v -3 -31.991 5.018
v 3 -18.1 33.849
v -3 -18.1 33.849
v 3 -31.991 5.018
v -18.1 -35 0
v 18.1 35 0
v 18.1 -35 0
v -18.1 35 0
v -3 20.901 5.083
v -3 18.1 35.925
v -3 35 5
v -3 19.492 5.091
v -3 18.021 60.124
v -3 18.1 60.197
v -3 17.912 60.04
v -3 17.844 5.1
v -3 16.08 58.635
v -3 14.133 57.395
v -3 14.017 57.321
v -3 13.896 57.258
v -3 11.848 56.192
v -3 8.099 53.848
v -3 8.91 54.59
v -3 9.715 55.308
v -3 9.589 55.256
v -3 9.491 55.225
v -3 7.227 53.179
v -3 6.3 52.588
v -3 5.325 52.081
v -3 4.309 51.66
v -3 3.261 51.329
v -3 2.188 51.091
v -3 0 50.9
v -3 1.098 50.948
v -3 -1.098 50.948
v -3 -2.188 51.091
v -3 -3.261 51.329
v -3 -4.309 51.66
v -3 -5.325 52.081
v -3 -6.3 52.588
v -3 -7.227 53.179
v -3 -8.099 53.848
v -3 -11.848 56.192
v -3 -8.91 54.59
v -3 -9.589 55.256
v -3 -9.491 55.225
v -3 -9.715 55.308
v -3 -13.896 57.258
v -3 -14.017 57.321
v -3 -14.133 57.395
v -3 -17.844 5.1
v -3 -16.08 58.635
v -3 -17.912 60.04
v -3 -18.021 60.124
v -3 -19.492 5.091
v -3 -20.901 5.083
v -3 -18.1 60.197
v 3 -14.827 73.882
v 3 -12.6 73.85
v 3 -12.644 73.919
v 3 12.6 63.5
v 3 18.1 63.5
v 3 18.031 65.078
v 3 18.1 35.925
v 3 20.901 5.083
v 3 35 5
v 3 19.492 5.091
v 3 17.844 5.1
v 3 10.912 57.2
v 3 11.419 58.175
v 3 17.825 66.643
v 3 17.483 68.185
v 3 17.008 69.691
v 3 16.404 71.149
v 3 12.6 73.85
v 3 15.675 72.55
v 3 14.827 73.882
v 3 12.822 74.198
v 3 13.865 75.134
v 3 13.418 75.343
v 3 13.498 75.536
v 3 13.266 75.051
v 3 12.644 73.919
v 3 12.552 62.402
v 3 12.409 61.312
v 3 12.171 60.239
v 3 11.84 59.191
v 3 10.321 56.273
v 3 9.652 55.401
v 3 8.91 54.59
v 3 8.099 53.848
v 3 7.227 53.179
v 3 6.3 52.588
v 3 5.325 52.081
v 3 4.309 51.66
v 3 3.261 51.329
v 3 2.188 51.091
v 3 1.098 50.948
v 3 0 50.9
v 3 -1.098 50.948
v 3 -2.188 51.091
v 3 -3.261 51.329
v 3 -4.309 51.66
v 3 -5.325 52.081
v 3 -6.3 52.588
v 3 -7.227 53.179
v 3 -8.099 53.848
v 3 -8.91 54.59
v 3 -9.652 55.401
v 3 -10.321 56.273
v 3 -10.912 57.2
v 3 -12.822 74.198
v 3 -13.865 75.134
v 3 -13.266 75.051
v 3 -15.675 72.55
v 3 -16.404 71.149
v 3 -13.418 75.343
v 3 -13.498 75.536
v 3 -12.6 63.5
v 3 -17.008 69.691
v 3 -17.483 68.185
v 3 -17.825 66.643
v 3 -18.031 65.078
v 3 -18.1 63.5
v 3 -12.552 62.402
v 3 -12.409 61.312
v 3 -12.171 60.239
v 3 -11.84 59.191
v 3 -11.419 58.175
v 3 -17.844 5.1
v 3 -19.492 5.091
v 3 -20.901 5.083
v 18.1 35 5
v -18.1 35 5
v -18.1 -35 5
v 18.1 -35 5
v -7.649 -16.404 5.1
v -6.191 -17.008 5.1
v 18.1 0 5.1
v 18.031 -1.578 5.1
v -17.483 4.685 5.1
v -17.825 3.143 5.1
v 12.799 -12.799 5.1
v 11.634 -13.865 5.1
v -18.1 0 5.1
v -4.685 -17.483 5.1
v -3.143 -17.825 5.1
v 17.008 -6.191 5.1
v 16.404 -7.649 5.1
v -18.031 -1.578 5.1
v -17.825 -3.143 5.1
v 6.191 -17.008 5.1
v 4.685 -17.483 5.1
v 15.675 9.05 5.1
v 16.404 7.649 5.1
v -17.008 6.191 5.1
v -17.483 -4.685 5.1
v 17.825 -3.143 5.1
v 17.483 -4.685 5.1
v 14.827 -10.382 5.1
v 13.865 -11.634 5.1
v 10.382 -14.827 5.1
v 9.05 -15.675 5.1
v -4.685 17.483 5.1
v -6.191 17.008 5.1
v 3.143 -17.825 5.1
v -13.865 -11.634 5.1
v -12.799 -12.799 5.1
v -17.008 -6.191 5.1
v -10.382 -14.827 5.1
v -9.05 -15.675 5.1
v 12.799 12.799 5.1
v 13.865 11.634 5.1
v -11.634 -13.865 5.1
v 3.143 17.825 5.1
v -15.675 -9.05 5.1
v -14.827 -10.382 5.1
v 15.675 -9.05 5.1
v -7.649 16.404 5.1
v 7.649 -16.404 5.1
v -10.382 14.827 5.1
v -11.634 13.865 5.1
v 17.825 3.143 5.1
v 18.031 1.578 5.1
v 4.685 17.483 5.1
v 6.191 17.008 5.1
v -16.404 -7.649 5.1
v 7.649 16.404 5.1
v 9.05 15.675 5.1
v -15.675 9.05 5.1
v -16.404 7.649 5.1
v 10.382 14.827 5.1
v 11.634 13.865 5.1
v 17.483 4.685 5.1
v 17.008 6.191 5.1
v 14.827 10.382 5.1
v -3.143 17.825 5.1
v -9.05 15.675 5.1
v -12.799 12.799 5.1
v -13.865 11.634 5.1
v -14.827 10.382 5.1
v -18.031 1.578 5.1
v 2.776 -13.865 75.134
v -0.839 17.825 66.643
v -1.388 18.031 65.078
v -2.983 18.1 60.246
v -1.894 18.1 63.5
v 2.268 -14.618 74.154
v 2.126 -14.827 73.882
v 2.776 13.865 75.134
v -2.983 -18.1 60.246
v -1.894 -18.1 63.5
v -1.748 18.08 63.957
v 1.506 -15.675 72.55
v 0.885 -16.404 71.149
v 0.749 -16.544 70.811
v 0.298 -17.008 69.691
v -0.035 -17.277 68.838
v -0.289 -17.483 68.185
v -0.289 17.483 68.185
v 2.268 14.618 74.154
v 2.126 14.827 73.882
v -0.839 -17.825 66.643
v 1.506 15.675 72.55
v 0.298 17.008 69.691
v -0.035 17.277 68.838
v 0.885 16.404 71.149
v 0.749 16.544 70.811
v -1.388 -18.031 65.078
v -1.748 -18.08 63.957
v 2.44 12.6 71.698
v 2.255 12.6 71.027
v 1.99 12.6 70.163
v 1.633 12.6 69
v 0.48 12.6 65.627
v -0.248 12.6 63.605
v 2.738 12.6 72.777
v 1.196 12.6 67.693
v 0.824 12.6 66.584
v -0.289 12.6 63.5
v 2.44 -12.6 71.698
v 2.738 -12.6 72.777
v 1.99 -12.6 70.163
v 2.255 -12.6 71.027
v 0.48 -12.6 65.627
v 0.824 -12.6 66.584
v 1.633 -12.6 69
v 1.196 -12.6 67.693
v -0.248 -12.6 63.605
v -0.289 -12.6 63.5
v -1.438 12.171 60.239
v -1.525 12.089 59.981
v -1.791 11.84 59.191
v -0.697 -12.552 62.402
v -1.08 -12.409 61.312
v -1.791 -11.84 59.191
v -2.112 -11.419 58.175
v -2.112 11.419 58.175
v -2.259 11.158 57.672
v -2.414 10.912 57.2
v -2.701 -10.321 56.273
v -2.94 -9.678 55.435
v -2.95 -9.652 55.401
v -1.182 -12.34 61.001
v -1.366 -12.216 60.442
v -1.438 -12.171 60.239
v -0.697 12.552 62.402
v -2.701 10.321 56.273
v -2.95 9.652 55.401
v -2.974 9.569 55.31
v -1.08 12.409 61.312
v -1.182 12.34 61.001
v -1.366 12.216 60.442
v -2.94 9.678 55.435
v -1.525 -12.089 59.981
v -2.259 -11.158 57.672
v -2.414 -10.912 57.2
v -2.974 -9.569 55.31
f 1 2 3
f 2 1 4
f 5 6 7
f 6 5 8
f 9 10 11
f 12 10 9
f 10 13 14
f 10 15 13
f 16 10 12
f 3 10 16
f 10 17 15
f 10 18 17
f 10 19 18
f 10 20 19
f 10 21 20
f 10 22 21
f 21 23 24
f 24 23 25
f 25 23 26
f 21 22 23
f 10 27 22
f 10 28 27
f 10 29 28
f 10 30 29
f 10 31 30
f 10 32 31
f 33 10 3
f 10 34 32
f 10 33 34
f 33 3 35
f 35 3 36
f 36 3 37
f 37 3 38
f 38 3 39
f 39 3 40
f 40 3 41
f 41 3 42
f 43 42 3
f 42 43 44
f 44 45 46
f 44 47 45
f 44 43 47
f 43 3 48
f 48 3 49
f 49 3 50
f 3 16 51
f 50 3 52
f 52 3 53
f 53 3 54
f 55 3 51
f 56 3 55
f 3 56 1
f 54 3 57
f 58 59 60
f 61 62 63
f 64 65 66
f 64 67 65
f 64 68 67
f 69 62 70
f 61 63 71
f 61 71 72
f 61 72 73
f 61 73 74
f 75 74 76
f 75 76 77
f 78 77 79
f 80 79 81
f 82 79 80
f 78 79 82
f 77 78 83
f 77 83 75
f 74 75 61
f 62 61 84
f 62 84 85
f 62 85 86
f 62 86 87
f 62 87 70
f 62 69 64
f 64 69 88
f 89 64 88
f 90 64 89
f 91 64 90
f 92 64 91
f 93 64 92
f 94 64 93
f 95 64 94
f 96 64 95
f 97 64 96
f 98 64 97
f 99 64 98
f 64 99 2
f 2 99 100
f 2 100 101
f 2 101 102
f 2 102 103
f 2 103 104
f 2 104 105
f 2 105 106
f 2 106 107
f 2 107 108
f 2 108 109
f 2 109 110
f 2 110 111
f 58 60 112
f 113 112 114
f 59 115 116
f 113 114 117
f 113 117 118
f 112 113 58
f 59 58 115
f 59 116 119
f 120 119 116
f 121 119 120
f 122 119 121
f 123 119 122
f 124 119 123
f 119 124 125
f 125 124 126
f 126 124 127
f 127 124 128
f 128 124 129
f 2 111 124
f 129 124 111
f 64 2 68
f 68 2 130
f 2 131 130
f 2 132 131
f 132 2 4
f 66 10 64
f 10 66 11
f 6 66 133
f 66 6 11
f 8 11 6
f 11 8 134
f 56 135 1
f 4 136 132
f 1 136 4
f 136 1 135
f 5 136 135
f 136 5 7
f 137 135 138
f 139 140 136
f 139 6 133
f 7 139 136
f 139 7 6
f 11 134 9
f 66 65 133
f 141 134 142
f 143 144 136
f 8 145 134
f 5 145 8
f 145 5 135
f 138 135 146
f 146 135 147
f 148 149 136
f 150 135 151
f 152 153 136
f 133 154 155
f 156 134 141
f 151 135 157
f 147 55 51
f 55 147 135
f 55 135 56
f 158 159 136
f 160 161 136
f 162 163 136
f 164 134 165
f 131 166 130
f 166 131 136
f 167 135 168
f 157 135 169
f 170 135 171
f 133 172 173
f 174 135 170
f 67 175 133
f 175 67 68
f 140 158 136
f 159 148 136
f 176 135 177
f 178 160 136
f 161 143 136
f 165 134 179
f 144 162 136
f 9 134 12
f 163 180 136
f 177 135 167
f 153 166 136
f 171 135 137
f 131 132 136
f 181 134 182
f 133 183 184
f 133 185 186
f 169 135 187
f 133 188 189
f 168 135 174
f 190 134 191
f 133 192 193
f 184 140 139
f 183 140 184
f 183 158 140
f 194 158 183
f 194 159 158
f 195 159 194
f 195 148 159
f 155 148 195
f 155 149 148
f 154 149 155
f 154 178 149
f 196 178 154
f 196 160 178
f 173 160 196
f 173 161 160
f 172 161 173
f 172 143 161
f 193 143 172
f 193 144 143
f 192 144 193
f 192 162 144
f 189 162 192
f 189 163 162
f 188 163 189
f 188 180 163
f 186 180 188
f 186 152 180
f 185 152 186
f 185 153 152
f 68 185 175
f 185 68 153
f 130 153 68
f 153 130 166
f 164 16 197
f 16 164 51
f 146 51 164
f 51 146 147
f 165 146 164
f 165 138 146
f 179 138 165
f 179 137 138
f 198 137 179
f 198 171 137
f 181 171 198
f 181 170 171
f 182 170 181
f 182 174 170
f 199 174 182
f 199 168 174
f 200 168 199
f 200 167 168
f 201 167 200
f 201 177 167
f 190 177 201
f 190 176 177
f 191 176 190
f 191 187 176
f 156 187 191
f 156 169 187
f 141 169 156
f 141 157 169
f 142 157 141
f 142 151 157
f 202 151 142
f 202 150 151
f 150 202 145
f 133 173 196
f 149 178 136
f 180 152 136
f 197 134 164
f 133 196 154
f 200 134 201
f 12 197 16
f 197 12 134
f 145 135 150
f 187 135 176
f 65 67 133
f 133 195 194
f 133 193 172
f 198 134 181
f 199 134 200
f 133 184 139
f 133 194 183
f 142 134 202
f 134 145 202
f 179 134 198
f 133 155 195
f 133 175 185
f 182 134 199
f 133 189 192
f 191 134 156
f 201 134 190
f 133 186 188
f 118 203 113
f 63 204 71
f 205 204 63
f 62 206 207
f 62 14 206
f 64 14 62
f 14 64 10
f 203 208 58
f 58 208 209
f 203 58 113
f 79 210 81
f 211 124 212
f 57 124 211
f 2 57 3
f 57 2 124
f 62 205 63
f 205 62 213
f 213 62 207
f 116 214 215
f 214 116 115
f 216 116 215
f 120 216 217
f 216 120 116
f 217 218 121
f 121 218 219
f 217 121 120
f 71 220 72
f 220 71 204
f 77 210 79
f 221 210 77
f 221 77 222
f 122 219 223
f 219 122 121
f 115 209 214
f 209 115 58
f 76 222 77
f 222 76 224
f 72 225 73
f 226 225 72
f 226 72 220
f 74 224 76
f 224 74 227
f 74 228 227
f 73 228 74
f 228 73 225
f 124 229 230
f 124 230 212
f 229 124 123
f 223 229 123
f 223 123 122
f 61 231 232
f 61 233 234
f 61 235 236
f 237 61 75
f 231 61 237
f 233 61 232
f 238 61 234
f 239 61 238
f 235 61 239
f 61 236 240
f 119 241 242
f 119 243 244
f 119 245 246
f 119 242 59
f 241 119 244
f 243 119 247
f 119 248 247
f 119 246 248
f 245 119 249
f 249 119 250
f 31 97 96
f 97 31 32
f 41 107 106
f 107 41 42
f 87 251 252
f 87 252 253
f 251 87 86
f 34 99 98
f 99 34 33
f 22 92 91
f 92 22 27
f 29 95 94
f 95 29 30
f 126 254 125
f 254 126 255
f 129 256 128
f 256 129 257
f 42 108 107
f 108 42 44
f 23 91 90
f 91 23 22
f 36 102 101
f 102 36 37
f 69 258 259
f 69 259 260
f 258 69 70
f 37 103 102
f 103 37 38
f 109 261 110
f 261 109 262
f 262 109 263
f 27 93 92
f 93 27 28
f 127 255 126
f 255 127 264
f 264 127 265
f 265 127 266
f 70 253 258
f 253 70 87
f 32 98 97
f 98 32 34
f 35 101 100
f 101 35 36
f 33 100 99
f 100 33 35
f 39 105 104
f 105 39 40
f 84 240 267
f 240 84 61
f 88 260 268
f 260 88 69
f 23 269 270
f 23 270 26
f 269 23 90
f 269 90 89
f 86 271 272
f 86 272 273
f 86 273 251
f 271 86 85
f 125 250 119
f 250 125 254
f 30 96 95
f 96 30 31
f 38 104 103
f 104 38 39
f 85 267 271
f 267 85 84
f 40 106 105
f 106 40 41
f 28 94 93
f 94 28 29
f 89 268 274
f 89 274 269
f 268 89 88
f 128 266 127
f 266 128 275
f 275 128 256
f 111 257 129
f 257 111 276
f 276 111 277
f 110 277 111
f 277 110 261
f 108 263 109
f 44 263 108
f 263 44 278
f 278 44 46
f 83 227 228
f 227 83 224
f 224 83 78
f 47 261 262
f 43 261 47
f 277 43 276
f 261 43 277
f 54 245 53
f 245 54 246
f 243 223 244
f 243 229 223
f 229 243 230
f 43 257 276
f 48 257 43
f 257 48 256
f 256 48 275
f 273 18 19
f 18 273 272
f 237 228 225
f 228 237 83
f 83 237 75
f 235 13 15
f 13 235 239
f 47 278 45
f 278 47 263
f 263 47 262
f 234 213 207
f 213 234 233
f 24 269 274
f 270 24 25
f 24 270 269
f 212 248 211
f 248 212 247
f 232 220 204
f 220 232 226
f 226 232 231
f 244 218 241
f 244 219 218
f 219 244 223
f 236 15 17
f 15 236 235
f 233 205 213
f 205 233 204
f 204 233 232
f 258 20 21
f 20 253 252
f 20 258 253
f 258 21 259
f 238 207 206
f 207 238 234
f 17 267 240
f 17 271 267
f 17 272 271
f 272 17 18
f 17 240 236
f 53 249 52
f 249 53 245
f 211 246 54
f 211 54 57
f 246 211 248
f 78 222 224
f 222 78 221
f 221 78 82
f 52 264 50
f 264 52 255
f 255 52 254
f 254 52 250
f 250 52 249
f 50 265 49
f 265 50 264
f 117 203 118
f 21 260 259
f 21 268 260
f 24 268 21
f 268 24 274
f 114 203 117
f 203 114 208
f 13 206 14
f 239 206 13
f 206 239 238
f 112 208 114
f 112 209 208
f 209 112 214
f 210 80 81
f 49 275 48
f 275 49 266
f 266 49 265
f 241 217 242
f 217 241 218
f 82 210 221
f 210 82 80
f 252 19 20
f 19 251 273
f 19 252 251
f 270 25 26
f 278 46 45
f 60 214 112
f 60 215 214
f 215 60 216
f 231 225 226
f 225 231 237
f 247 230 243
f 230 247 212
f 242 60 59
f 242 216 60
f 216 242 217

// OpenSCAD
// MTG Kiosk - label roll spool
//
// Freestanding holder that sits behind the printer and feeds the rear label
// inflow. Deliberately not bolted to the printer: the back face already
// carries USB, DC in, the power rocker and the label slot, and hanging a roll
// off it would crowd all four.
//
//   openscad -o label_spool.stl -D 'part="upright"' label_spool.scad
//   openscad -o spindle.stl     -D 'part="spindle"' label_spool.scad
//
// CONFIRM THESE AGAINST A REAL ROLL BEFORE PRINTING. They are the common
// values for 4x6 thermal stock, not measurements of the roll in hand, and the
// printer's own paperwork has already been wrong twice.

// -------------------------------------------------------------- roll (check)
roll_max_d   = 105.0;   // outside diameter of a full roll
roll_width   = 80.0;    // production stock here is 3in (76.2mm); 4in is 101.6
core_d       = 25.4;    // 1in core. The other common size is 38mm (1.5in)

// ------------------------------------------------------------------ hardware
spindle_d    = core_d - 1.2;   // slips inside the core and turns freely
spindle_over = 18.0;           // length beyond the roll, each side
slot_w       = spindle_d + 1.0;

base_t       = 5.0;
base_d       = 70.0;
upright_t    = 6.0;
wall         = 3.0;

// Spindle centre height. The roll has to clear the base at full diameter, and
// a little more so a fresh roll doesn't drag as it unwinds.
spindle_h    = roll_max_d / 2 + base_t + 6;

part = "upright";       // "upright" | "spindle" | "both"

$fn = 72;

// ------------------------------------------------------------------ geometry

upright_w = spindle_d + wall * 4;

// One side support. Two are printed; they are mirror images only in placement,
// so the same part is used twice.
module upright() {
  difference() {
    union() {
      // Foot, long in the feed direction so a full roll can't tip it.
      hull() {
        translate([-upright_w / 2, -base_d / 2, 0]) cube([upright_w, base_d, base_t]);
        translate([0, 0, base_t]) cylinder(h = 0.1, d = upright_w);
      }
      // Post.
      hull() {
        translate([-upright_t / 2, -upright_w / 2, 0]) cube([upright_t, upright_w, 1]);
        translate([-upright_t / 2, 0, spindle_h]) rotate([0, 90, 0])
          cylinder(h = upright_t, d = upright_w);
      }

      // Gussets fore and aft. The static weight of the roll is straight down
      // and the post handles that easily, but paying out label pulls the top
      // horizontally toward the printer, and that is a bending moment on a
      // 6mm blade 63mm long. These take it into the foot instead.
      for (dir = [-1, 1])
        hull() {
          translate([-upright_t / 2, dir * (upright_w / 2 - 1), 0])
            cube([upright_t, 1, base_t + 1]);
          translate([-upright_t / 2, dir * (base_d / 2 - wall), 0])
            cube([upright_t, wall, base_t]);
          translate([-upright_t / 2, dir * (upright_w / 2 - 1), spindle_h * 0.55])
            cube([upright_t, 1, 1]);
        }
    }

    // Open-topped slot rather than a bored hole: the spindle lifts straight
    // out with the roll still on it, so reloading doesn't mean threading a bar
    // through a captive frame with one hand.
    translate([-upright_t / 2 - 1, -slot_w / 2, spindle_h])
      cube([upright_t + 2, slot_w, spindle_h]);
    translate([-upright_t / 2 - 1, 0, spindle_h]) rotate([0, 90, 0])
      cylinder(h = upright_t + 2, d = slot_w);

    // Chamfer the slot mouth so the spindle drops in without being aimed.
    // This has to sit at the top of the post; an earlier version put it at
    // twice the spindle height, which is above the part, so it cut nothing.
    translate([-upright_t / 2 - 1, 0, spindle_h + upright_w / 2])
      rotate([0, 90, 0]) cylinder(h = upright_t + 2, d1 = slot_w * 2.4, d2 = slot_w);
  }
}

module spindle() {
  length = roll_width + spindle_over * 2;
  difference() {
    union() {
      cylinder(h = length, d = spindle_d);
      // End flanges stop the roll walking off while it unwinds.
      for (z = [0, length]) translate([0, 0, z])
        cylinder(h = 3, d = spindle_d + 10, center = true);
    }
    // Hollow: this is the longest part on the plate and solid bar is wasted
    // filament with no strength to show for it in bending.
    translate([0, 0, -1]) cylinder(h = length + 2, d = spindle_d - 5);
  }
}

if (part == "upright")      upright();
else if (part == "spindle") spindle();
else {
  span = roll_width + upright_t;
  translate([-span / 2, 0, 0]) upright();
  translate([ span / 2, 0, 0]) upright();
  translate([-(roll_width / 2 + spindle_over), 0, spindle_h]) rotate([0, 90, 0]) spindle();
}

echo(str("spindle centre height: ", spindle_h, " mm"));
echo(str("clear span needed between uprights: ", roll_width, " mm"));
echo(str("overall width with uprights: ",
         roll_width + spindle_over * 2 + upright_t * 2, " mm"));
echo(str("upright footprint: ", upright_w, " x ", base_d, " mm"));
